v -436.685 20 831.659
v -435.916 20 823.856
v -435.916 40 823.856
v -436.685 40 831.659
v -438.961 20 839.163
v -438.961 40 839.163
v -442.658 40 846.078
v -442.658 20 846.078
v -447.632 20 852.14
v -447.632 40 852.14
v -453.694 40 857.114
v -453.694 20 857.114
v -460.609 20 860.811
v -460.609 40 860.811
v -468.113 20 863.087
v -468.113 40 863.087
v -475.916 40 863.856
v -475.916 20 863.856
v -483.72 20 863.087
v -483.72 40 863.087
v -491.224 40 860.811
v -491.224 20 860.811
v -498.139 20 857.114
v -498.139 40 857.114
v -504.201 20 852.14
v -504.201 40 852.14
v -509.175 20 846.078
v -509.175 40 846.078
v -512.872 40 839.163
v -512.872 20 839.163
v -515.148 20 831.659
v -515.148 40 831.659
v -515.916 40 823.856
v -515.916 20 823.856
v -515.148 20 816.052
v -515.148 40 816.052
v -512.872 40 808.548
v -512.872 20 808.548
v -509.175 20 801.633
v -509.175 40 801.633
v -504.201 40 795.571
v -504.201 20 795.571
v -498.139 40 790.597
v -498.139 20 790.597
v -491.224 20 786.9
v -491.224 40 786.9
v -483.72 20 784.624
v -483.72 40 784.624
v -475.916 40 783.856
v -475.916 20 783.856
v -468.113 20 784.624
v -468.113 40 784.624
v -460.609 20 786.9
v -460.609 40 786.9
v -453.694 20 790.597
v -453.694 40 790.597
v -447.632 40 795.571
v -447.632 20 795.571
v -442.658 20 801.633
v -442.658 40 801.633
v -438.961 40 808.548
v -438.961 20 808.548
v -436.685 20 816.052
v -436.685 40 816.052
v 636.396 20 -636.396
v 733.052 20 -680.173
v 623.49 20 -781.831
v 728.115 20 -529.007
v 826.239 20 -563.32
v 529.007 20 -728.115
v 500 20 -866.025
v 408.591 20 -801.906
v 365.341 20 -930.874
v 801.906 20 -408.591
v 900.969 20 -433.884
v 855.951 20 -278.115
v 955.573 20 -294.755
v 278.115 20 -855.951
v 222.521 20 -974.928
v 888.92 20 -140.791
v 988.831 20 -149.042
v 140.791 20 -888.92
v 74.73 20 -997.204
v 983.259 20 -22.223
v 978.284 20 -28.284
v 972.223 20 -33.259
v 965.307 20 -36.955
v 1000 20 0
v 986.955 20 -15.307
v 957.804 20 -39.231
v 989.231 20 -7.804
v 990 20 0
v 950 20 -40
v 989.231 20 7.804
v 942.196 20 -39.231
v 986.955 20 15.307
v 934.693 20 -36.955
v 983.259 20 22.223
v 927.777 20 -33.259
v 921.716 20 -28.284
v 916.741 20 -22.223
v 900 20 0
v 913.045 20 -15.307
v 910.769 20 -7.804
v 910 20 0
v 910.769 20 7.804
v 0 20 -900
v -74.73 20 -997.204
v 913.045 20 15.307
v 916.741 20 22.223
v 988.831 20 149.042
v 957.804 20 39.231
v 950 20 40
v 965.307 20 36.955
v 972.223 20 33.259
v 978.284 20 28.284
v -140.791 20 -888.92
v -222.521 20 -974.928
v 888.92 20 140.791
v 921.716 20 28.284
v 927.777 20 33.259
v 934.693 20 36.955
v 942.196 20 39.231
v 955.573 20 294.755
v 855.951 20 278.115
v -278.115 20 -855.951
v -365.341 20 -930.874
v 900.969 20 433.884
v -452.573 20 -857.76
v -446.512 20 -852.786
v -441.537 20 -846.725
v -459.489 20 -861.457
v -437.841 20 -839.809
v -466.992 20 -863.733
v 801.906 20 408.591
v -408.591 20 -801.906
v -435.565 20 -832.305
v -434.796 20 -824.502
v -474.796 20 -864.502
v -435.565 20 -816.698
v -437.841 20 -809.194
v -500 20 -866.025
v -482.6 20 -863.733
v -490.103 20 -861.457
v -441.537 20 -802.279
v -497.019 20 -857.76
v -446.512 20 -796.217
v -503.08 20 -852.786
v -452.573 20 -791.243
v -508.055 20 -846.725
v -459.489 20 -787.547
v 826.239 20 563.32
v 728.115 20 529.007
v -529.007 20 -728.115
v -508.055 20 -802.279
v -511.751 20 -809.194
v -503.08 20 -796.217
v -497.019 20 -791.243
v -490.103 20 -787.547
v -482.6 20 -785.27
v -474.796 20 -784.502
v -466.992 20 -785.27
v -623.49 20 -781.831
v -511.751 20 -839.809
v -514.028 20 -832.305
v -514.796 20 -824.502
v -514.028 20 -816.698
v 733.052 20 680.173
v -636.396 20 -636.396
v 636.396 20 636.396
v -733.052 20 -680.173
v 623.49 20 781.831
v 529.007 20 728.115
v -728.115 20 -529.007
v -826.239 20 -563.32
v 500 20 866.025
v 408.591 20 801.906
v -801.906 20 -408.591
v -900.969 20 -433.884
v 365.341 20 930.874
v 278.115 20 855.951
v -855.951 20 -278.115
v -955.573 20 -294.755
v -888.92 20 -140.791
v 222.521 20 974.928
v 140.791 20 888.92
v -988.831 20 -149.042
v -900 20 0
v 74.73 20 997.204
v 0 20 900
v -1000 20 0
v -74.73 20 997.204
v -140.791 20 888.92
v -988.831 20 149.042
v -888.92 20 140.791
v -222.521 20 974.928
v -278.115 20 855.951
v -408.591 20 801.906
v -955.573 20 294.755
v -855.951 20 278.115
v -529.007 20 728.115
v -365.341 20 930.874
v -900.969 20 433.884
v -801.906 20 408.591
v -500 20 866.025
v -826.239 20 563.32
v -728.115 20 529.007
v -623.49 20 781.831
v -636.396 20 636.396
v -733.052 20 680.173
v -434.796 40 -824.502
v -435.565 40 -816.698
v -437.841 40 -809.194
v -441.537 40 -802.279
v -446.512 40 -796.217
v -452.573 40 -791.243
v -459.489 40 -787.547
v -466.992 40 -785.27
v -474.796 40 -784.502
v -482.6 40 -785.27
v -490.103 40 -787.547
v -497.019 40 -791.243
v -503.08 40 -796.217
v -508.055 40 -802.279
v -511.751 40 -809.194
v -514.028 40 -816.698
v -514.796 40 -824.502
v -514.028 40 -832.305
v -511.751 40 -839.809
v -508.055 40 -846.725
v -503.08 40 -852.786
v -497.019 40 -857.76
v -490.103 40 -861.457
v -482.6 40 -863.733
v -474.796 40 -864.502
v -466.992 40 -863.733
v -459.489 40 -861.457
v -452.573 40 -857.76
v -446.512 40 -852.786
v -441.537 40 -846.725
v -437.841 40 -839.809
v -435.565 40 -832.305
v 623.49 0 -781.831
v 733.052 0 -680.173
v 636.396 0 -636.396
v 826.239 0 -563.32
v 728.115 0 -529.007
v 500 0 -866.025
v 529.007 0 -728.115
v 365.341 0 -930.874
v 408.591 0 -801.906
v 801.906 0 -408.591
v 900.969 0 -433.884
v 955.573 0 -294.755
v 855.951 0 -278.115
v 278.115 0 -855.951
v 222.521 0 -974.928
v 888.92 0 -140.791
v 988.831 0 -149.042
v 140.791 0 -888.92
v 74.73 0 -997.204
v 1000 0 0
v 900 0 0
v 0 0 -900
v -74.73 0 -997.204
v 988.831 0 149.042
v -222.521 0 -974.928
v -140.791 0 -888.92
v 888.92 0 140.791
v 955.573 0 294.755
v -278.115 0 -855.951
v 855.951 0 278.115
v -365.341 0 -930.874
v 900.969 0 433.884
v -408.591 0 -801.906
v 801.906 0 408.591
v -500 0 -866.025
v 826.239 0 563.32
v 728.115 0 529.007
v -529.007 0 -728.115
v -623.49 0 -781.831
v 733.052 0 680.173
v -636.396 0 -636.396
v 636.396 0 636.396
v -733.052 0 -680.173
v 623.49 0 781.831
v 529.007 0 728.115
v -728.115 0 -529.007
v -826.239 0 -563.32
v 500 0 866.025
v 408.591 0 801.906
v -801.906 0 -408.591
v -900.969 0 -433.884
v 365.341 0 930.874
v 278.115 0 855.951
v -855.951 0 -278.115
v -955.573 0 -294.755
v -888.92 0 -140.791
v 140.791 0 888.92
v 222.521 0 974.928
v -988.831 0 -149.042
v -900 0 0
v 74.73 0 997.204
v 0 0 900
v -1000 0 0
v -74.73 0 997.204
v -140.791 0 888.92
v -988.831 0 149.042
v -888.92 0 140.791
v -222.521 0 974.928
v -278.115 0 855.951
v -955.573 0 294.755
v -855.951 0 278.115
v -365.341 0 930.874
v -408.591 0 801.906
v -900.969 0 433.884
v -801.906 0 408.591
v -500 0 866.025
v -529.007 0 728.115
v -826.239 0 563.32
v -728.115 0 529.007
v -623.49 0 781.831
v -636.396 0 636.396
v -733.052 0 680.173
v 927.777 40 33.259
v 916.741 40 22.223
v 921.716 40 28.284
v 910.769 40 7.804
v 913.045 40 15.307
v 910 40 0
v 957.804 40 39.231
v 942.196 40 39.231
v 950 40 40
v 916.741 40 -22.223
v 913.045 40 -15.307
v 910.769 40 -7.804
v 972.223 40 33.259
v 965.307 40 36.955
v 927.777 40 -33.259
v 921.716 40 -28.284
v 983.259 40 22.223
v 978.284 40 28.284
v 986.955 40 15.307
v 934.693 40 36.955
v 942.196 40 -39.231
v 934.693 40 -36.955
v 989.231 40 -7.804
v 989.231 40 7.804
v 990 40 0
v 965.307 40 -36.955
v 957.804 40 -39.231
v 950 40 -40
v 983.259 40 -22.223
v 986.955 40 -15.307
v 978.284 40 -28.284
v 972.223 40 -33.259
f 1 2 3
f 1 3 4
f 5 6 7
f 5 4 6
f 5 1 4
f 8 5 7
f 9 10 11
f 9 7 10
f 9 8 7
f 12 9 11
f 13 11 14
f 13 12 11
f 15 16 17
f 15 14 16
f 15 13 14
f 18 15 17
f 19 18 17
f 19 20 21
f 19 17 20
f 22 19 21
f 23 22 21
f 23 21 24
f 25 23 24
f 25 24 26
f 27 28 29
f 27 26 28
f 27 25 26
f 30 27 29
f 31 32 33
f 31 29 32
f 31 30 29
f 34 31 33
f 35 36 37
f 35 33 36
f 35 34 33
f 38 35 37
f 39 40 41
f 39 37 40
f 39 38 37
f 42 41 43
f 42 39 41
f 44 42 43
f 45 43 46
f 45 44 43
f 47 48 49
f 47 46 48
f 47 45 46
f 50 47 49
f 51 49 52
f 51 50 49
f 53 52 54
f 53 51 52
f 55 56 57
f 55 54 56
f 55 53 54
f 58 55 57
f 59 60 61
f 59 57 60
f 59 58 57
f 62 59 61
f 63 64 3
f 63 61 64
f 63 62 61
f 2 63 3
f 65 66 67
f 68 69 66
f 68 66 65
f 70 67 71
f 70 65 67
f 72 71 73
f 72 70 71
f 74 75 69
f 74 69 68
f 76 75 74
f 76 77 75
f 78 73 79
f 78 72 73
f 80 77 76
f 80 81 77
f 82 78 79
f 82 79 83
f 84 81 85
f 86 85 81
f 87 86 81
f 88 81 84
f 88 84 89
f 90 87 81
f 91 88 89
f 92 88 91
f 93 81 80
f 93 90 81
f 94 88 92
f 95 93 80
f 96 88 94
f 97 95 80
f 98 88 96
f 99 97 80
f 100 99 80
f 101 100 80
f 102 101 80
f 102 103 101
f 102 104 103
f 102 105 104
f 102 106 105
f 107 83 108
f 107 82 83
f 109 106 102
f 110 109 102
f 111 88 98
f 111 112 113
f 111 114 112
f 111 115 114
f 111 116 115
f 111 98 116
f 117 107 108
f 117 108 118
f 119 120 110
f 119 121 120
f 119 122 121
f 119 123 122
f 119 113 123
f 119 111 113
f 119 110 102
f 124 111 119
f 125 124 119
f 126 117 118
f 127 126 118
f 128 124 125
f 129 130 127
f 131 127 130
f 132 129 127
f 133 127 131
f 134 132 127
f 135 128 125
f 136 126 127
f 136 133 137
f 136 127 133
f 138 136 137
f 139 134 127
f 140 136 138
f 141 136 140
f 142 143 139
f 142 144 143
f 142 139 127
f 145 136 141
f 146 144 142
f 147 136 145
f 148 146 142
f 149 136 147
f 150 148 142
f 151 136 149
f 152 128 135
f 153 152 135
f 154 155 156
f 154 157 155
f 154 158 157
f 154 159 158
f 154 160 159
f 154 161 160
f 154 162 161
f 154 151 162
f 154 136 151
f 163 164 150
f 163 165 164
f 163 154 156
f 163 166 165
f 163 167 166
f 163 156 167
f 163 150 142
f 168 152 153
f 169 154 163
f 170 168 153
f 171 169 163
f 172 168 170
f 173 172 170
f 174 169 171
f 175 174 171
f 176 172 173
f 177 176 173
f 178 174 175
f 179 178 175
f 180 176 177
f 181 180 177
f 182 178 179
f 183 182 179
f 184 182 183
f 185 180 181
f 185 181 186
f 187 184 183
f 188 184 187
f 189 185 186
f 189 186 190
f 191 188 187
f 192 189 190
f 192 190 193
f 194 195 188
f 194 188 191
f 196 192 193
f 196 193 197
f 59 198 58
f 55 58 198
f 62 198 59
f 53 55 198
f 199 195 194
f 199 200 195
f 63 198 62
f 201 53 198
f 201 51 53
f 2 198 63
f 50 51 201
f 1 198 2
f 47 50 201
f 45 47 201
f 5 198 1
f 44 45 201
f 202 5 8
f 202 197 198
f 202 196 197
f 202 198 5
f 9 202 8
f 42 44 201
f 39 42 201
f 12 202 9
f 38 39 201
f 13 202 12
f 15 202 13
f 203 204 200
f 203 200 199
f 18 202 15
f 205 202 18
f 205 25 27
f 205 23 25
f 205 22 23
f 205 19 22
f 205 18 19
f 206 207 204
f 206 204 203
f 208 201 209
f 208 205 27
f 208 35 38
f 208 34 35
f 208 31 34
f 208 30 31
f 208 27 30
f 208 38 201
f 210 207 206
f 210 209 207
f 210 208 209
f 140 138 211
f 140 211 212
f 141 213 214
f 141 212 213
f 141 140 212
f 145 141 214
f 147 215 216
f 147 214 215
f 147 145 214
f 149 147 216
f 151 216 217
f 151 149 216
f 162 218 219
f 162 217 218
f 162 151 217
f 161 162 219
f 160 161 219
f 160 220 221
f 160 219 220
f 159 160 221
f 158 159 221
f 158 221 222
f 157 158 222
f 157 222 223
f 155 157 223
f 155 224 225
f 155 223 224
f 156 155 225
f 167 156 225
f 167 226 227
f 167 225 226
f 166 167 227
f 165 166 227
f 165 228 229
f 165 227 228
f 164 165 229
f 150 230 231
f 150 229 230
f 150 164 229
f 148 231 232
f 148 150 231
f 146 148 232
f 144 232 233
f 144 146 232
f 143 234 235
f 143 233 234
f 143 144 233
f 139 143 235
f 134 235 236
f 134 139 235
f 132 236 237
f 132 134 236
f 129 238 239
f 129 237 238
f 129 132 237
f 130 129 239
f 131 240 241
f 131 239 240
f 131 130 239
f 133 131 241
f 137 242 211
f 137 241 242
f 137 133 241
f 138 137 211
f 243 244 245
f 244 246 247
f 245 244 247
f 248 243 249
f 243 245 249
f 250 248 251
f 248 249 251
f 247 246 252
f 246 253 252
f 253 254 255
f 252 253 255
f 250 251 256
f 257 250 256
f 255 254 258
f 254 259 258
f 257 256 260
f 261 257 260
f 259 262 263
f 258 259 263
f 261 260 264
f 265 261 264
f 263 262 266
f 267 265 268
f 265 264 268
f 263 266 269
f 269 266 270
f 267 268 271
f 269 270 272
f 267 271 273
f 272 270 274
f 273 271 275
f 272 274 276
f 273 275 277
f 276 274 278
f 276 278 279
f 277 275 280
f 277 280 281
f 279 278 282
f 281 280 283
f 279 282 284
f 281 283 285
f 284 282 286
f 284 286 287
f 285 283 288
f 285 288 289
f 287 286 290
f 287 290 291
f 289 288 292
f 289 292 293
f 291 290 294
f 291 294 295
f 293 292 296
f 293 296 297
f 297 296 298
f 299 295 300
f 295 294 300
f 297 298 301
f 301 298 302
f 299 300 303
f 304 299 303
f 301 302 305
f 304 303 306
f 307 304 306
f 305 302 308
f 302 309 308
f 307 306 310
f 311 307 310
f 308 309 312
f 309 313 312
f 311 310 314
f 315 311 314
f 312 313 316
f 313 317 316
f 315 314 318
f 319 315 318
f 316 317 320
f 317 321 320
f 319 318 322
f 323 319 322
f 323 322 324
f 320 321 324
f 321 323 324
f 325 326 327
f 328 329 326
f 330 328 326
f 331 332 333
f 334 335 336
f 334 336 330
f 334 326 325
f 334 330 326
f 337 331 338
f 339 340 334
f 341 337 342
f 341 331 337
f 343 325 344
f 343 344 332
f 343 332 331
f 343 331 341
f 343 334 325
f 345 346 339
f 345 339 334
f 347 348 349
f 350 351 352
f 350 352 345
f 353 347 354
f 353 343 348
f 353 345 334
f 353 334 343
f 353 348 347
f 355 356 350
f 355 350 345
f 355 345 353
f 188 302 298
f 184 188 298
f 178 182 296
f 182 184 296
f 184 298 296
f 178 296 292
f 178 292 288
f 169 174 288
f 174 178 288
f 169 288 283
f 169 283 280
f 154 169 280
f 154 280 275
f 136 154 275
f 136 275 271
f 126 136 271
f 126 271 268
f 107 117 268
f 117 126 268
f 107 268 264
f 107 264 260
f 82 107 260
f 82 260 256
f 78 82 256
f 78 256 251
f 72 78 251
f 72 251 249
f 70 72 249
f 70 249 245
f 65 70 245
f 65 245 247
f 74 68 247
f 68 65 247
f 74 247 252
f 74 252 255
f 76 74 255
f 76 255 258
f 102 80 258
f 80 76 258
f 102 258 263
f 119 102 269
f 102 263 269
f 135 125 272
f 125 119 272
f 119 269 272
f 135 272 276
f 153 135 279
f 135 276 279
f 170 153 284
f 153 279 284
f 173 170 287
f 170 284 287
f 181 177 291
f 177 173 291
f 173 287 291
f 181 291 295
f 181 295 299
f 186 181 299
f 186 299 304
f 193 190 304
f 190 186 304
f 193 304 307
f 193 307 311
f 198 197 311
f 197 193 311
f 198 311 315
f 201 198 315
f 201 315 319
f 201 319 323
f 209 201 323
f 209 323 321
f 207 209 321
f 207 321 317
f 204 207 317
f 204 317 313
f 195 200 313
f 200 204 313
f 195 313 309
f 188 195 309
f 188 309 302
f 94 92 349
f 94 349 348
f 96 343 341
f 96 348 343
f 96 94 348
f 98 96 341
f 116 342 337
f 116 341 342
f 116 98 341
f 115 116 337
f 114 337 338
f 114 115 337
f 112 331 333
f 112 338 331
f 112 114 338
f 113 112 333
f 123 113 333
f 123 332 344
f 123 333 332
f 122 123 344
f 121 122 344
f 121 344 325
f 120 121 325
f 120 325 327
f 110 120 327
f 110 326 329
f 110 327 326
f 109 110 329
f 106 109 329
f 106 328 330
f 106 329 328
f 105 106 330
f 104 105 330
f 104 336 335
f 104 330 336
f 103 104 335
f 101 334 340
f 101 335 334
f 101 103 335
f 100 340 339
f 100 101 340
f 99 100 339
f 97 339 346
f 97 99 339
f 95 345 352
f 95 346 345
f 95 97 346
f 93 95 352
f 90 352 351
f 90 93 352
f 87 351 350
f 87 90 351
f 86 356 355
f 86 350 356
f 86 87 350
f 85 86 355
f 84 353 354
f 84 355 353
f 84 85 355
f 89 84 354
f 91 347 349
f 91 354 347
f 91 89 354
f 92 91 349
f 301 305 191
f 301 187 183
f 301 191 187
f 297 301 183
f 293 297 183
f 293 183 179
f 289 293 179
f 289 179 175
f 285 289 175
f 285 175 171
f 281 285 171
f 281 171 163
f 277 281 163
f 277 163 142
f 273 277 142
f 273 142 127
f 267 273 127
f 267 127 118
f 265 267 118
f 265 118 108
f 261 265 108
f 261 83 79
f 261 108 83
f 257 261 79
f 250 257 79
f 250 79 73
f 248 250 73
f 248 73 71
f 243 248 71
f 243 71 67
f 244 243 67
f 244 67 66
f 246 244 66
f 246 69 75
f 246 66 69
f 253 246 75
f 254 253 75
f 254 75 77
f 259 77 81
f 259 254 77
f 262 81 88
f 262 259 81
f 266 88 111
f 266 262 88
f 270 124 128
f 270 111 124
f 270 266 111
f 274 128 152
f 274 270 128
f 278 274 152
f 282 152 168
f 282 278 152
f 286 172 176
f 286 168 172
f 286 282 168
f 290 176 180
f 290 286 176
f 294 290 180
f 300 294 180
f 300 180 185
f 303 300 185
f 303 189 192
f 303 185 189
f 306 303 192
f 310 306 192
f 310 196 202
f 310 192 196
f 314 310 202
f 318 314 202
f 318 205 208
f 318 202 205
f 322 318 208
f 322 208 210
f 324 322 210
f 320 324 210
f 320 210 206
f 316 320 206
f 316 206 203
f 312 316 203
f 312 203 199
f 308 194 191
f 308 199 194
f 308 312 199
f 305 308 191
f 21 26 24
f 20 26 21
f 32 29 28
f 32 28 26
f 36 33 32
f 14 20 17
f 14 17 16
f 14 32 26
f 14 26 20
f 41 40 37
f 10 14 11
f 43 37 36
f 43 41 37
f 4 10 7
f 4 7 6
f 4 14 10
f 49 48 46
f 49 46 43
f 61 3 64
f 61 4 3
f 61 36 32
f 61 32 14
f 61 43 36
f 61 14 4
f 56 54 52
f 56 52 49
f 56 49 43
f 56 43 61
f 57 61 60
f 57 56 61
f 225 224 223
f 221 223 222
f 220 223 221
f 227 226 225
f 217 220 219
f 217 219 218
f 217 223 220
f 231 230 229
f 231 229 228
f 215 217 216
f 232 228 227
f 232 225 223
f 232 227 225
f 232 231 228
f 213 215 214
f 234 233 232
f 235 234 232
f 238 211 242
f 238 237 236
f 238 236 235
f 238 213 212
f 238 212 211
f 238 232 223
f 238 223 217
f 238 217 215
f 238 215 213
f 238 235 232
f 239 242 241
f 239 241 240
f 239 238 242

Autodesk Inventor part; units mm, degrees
ref_plane "YZ Plane" through (0, 0, 0) normal (1, 0, 0) x (0, 1, 0)
ref_plane "XZ Plane" through (0, 0, 0) normal (0, 1, 0) x (-1, 0, 0)
ref_plane "XY Plane" through (0, 0, 0) normal (0, 0, 1) x (1, 0, 0)
sketch "Sketch1" plane through (0, 0, 0) normal (0, 1, 0) x (-1, 0, 0)
  circle A0 centre (0, 0) radius 900
  circle A1 centre (0, 0) radius 1000
  dimension "d0" = 1800
  dimension "d1" = 100
extrude "Extrusion1" add sketch "Sketch1" along normal blind 20
sketch "Sketch2" plane through (0, 20, 0) normal (0, 1, 0) x (1, 0, 0)
  circle A0 centre (950, 0) radius 40
  circle A1 centre (-474.7961, 824.5017) radius 40
  circle A2 centre (-475.9164, -823.8556) radius 40
  line L0 (0, 0) -> (943.1963, 0) construction
  dimension "d7" = 360
  dimension "d11" = 950
  dimension "d13" = 80
  dimension "d14" = 80
extrude "Extrusion2" add sketch "Sketch2" along normal blind 20
sketch "Sketch3" plane through (0, 20, 0) normal (0, 1, 0) x (1, 0, 0)
  point P0 (0, 0)
